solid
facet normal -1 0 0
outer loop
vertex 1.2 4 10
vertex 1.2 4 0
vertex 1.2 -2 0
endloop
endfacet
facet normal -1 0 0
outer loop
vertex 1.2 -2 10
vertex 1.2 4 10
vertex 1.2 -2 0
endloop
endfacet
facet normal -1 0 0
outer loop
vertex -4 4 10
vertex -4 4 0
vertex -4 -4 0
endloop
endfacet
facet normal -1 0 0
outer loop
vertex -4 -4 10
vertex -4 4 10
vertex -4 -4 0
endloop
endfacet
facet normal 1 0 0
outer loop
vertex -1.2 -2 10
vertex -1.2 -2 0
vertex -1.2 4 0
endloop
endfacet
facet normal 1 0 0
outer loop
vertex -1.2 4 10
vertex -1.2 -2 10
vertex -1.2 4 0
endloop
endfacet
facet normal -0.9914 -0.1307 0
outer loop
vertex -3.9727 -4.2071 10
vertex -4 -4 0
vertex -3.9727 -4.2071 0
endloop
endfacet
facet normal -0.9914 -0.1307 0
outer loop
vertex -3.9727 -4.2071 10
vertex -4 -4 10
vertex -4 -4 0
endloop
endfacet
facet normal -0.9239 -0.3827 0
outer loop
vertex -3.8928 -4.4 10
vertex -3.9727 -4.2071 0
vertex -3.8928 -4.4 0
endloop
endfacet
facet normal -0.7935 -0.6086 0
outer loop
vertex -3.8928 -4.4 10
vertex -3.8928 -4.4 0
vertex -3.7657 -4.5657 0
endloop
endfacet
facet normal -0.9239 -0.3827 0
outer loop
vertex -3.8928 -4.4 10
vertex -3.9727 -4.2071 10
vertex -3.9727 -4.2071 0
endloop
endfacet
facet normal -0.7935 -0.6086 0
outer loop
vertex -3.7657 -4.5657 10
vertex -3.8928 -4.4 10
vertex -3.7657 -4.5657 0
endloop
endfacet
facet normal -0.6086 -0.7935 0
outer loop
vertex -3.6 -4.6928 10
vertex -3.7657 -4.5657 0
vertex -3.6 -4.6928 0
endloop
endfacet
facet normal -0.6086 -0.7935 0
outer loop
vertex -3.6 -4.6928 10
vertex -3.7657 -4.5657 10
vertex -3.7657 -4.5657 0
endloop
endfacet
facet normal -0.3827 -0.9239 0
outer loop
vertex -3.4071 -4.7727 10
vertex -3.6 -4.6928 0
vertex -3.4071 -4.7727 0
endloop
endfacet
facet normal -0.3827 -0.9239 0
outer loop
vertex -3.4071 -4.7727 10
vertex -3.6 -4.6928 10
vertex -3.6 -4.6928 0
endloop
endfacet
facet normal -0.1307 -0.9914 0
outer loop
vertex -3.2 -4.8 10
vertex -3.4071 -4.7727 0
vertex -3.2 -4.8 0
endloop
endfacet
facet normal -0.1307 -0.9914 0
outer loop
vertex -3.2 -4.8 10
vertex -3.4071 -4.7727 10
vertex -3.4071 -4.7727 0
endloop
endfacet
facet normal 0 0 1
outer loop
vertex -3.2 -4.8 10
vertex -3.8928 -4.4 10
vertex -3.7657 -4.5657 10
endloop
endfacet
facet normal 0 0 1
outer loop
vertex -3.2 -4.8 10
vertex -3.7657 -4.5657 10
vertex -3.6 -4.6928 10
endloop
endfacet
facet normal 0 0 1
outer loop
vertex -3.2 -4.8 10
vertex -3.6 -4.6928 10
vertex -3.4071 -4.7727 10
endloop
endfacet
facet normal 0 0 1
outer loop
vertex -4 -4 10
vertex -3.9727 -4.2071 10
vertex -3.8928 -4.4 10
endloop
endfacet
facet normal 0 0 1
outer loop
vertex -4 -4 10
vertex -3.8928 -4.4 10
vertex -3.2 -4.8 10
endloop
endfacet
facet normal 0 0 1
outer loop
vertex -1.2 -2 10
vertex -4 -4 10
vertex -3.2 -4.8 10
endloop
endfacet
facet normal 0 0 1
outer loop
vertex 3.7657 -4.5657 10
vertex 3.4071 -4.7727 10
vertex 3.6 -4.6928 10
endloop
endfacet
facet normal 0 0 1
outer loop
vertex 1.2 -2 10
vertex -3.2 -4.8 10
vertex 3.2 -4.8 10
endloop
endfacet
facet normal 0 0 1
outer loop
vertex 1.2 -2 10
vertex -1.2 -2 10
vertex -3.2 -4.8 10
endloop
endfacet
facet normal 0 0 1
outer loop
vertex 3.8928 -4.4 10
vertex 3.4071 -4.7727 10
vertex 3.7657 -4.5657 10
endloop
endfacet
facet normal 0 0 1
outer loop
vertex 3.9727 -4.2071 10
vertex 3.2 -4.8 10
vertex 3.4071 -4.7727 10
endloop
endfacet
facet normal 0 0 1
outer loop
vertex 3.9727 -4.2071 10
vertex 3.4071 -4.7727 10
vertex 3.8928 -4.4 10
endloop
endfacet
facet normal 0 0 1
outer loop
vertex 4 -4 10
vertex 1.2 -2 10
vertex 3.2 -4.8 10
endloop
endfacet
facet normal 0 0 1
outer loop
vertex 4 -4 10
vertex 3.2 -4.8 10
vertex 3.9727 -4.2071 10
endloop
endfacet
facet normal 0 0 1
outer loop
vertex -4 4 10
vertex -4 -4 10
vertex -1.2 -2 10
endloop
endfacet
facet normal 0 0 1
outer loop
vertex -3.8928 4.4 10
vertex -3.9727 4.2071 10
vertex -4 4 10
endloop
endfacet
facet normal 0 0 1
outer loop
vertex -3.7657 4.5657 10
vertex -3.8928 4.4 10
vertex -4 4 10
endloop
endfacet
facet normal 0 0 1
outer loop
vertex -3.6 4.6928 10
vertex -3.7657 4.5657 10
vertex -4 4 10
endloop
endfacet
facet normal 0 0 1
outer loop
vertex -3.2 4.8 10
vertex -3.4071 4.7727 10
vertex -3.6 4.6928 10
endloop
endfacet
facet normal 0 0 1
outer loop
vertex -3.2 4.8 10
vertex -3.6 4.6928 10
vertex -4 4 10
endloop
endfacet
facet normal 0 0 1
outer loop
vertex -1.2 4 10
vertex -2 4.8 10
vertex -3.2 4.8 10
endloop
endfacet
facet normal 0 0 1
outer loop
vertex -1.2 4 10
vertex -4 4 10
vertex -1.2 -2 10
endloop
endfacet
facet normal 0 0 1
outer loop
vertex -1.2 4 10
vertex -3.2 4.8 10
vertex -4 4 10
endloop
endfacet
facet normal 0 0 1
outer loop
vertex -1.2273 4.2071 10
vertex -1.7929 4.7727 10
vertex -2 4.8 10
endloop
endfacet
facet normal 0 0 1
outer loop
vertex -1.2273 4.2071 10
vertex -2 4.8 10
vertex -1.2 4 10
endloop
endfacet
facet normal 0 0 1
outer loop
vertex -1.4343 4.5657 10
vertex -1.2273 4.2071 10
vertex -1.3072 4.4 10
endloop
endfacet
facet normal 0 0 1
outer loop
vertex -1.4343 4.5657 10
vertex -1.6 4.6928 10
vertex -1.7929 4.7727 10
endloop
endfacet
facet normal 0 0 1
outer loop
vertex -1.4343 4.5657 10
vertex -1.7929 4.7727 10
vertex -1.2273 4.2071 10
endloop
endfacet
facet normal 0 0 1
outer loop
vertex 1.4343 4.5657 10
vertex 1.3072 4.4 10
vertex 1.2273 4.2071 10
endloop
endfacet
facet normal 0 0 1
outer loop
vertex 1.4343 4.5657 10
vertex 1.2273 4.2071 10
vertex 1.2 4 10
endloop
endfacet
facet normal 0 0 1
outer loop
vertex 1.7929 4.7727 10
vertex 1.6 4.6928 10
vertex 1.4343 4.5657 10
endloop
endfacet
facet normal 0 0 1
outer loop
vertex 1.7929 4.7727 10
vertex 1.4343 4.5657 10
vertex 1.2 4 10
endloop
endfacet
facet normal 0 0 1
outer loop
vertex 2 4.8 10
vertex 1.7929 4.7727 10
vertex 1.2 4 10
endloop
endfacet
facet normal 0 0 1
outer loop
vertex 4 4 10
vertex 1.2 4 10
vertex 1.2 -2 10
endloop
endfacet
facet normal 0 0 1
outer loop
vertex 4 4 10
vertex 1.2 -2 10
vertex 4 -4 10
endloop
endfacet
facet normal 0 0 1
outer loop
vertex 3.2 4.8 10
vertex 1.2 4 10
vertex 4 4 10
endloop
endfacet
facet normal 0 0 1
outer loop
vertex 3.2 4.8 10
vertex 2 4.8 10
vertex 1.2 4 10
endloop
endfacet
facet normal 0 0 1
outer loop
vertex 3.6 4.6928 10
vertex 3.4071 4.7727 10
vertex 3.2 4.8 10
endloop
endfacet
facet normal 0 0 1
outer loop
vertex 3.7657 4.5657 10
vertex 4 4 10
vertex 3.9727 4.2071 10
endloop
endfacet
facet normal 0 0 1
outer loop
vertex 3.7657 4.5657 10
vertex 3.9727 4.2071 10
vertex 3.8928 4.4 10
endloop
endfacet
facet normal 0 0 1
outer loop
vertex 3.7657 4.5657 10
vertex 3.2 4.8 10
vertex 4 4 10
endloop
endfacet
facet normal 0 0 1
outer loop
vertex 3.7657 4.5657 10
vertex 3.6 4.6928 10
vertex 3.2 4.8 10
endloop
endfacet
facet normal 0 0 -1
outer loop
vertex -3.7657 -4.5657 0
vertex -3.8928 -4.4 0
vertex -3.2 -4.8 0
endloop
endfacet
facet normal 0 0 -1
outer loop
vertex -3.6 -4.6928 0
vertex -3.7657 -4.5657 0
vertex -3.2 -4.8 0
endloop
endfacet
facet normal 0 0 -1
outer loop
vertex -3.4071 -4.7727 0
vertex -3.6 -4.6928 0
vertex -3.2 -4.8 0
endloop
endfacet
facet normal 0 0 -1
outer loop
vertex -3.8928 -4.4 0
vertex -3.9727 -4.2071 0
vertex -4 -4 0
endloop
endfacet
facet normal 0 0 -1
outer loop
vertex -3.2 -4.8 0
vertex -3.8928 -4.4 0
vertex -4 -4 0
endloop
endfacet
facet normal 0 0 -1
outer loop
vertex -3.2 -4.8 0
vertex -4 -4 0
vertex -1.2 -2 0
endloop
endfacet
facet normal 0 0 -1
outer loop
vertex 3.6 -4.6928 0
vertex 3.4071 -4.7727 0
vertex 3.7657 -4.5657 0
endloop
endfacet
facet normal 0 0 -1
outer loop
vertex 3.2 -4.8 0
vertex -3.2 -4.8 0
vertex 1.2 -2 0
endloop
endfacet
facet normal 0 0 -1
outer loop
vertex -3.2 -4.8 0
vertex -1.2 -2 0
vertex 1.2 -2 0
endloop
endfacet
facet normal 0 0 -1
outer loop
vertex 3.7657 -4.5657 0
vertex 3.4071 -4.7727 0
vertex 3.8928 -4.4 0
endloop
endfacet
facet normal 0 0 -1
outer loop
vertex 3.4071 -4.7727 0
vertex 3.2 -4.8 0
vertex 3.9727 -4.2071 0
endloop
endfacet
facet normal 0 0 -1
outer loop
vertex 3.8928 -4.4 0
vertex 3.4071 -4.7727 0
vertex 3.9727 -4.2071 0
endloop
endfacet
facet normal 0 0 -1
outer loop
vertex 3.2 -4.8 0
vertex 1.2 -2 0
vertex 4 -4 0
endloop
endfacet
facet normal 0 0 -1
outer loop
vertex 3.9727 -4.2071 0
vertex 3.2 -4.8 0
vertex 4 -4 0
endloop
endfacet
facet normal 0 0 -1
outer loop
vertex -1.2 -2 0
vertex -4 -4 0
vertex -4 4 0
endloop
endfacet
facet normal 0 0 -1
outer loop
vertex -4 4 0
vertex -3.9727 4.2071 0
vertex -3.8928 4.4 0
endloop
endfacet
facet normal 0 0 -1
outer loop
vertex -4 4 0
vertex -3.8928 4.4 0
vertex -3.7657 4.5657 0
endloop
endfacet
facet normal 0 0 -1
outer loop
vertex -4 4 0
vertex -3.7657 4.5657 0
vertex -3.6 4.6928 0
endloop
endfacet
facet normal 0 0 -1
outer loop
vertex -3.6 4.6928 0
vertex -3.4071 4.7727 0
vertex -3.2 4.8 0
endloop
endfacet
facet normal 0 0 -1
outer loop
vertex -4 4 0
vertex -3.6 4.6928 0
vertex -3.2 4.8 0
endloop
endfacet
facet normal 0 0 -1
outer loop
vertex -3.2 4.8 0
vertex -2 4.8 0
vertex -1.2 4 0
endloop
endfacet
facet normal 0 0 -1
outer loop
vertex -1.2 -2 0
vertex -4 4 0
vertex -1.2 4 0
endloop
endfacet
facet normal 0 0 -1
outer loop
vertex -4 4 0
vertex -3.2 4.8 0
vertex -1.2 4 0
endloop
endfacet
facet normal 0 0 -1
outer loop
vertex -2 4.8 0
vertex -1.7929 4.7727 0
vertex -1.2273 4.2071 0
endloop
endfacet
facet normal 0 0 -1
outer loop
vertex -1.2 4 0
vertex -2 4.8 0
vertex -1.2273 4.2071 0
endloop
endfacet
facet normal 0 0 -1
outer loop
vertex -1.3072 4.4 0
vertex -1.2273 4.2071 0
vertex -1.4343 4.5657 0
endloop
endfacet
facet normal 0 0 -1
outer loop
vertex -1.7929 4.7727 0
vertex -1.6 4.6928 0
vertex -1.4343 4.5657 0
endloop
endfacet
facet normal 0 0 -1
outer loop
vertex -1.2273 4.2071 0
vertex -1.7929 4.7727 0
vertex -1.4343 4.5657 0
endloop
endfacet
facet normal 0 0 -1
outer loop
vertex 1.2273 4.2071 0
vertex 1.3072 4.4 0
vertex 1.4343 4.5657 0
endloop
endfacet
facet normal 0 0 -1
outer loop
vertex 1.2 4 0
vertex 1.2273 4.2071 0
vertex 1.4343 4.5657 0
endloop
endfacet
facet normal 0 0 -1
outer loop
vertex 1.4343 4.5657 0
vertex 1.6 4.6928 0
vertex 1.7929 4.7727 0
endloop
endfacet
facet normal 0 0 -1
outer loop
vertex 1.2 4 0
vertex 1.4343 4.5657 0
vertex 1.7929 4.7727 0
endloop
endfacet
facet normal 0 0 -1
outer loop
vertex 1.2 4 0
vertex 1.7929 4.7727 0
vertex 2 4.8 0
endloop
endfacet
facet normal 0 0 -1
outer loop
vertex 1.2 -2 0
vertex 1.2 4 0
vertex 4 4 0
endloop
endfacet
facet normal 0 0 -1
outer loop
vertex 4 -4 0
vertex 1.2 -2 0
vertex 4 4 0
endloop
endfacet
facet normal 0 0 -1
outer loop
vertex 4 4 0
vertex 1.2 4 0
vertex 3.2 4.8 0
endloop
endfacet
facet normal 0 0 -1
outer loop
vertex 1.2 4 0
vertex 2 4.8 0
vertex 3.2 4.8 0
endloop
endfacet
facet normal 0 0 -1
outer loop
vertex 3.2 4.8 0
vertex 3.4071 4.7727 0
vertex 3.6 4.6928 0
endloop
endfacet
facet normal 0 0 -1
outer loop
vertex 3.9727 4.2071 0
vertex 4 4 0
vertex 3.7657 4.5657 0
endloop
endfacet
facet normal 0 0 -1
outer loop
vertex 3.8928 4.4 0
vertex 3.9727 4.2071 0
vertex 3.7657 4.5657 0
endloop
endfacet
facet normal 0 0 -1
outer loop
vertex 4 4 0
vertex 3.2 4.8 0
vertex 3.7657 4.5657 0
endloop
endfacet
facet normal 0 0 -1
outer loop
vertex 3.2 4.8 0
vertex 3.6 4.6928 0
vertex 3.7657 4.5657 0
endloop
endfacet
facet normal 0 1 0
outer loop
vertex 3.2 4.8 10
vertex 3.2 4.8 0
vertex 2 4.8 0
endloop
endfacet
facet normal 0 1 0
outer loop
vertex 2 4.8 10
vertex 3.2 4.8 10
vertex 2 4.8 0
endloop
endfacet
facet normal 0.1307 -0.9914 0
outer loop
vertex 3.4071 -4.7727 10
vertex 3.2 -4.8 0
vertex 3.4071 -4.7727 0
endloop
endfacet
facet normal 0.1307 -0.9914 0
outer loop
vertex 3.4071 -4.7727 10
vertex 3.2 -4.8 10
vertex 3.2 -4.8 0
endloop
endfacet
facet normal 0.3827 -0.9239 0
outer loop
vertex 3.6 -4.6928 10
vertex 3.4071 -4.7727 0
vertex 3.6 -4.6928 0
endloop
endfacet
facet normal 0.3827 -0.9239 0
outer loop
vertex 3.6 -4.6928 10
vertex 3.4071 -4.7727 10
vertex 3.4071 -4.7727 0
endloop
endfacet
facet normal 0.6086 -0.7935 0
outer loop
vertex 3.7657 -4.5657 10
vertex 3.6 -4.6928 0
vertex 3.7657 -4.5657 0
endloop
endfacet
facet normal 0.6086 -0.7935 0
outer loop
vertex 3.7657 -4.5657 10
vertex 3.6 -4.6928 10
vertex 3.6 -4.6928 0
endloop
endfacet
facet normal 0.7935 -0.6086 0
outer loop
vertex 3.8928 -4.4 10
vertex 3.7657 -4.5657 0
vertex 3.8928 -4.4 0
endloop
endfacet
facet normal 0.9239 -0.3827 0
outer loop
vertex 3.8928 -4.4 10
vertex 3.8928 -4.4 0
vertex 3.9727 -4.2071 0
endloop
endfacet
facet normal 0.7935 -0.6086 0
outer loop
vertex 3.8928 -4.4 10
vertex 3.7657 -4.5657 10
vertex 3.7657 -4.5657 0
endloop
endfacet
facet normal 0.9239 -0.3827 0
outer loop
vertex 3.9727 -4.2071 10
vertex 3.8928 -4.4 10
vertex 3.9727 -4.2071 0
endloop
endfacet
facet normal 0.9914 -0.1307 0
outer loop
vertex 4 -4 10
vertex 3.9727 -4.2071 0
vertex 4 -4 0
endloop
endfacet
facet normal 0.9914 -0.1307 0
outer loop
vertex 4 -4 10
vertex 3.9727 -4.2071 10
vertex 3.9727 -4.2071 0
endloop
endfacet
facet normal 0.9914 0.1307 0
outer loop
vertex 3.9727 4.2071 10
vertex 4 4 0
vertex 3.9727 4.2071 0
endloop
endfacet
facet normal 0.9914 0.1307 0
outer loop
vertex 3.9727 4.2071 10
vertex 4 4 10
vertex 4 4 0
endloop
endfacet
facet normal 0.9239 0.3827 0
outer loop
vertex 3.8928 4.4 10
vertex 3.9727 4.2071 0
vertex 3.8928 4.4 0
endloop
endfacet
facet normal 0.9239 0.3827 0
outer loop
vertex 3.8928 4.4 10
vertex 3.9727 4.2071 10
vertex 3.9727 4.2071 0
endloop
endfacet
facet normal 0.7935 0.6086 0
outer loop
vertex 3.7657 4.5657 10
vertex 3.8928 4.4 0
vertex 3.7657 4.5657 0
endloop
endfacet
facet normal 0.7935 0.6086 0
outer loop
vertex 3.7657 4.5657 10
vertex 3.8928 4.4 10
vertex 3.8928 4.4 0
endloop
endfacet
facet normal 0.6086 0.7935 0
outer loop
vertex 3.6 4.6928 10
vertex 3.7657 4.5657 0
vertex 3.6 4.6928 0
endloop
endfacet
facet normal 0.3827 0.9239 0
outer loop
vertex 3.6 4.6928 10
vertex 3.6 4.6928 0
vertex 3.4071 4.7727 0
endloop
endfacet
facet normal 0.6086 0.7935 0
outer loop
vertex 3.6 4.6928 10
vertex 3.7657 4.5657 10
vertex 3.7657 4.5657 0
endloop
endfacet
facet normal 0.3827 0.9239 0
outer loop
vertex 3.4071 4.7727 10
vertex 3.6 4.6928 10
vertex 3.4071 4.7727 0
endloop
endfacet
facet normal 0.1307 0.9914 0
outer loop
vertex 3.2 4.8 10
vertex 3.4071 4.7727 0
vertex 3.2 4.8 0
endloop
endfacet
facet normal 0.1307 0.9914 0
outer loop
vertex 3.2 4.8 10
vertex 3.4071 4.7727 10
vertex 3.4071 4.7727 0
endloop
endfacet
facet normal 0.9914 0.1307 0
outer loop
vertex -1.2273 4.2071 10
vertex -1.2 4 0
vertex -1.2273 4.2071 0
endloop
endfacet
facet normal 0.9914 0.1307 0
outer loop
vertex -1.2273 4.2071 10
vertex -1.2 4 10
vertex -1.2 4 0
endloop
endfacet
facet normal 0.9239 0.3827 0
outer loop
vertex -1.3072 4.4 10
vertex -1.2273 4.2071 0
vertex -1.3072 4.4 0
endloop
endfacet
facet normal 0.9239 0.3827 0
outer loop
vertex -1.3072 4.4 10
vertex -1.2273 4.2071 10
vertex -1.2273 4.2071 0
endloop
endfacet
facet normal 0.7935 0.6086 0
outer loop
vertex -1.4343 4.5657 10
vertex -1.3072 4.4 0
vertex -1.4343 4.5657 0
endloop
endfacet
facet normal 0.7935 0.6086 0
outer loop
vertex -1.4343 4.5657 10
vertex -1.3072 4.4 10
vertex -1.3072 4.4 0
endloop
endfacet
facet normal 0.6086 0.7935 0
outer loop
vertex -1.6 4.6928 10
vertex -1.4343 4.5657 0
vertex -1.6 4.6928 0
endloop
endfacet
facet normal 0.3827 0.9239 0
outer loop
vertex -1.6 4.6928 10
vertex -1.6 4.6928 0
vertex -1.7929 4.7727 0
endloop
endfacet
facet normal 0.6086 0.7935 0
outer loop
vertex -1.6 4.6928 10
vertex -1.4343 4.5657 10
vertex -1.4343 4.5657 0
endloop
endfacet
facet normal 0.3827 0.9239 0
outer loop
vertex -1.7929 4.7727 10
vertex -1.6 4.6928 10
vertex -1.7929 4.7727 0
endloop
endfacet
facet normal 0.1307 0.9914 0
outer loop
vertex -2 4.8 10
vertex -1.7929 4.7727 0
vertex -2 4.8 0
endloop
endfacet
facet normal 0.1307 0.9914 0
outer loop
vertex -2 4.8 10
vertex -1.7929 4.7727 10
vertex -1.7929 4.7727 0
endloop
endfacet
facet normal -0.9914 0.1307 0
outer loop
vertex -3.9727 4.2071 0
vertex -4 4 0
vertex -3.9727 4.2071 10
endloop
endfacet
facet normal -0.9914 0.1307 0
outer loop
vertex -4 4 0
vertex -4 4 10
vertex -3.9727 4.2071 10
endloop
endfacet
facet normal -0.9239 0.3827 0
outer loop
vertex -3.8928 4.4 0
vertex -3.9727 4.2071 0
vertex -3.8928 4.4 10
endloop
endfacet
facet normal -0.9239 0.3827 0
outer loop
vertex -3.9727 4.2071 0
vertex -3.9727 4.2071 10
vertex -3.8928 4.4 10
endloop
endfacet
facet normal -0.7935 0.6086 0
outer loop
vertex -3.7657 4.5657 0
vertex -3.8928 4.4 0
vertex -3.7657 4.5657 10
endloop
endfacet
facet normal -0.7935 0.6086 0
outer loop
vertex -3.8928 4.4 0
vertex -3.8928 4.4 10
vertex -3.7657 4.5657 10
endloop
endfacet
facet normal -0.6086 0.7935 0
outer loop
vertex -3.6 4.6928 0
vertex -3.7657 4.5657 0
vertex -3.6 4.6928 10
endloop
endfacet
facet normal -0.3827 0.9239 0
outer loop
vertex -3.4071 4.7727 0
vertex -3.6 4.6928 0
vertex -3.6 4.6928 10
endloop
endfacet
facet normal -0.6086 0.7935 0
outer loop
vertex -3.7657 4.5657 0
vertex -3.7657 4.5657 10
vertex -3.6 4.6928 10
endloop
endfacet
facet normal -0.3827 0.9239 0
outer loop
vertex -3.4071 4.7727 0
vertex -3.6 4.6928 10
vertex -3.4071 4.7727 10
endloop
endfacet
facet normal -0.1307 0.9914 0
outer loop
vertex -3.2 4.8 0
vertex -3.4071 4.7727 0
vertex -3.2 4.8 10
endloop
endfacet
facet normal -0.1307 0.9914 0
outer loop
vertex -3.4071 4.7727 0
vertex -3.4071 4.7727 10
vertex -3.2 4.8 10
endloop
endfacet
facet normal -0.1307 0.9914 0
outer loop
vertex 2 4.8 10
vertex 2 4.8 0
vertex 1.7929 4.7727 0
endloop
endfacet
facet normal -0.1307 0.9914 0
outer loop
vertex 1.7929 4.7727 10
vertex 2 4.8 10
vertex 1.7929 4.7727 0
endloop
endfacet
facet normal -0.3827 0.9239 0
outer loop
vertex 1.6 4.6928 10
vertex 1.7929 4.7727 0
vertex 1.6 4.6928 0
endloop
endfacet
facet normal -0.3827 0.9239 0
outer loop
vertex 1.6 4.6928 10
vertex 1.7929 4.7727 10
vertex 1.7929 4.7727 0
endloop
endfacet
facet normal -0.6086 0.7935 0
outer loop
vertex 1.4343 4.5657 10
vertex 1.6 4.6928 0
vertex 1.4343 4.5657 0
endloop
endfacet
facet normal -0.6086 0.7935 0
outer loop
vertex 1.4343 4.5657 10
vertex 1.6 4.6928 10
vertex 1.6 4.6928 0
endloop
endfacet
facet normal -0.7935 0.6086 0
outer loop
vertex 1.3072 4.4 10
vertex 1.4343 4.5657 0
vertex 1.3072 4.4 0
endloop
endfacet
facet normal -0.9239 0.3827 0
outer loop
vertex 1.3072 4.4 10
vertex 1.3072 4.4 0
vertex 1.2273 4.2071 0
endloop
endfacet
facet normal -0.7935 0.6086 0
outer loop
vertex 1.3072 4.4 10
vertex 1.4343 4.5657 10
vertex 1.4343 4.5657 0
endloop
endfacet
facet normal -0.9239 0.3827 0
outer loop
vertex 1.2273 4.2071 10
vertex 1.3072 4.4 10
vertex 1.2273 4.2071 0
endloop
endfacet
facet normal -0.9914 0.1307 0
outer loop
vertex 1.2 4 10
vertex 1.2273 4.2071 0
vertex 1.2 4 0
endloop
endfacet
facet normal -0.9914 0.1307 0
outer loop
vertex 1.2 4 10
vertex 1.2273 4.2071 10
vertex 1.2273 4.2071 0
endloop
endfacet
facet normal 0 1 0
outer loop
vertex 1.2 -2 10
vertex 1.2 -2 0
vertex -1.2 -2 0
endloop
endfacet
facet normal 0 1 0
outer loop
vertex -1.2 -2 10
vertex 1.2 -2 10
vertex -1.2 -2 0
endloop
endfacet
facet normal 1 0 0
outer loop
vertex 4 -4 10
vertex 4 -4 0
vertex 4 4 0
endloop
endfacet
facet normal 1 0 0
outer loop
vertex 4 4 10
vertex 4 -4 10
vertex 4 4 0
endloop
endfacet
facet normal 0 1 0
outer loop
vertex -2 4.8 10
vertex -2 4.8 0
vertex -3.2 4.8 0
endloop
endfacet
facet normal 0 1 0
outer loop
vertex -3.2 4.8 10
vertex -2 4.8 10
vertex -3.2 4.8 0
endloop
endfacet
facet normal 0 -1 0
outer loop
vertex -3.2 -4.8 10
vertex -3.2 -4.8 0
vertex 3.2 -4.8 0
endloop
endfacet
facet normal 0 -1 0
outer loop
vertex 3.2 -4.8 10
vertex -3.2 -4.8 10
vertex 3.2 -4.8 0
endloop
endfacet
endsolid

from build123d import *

# Parameters (mm, degrees)
PAD_DEPTH = 10
FILLET_R  = 0.8


with BuildPart() as part:
    # Sketch → Pad (new body)
    with BuildSketch(Plane.XY):
        Polygon((-4, 4.8), (-4, -4.8), (4, -4.8), (4, 4.8), (1.2, 4.8), (1.2, -2), (-1.2, -2), (-1.2, 4.8), align=None)
    extrude(amount=PAD_DEPTH)

    # Fillet
    fillet_edges = [part.edges().sort_by_distance(p)[0] for p in [
        (-4, -4.8, 5),
        (4, -4.8, 5),
        (4, 4.8, 5),
        (1.2, 4.8, 5),
        (-4, 4.8, 5),
        (-1.2, 4.8, 5),
    ]]
    fillet(fillet_edges, radius=FILLET_R)


solid = part.part
